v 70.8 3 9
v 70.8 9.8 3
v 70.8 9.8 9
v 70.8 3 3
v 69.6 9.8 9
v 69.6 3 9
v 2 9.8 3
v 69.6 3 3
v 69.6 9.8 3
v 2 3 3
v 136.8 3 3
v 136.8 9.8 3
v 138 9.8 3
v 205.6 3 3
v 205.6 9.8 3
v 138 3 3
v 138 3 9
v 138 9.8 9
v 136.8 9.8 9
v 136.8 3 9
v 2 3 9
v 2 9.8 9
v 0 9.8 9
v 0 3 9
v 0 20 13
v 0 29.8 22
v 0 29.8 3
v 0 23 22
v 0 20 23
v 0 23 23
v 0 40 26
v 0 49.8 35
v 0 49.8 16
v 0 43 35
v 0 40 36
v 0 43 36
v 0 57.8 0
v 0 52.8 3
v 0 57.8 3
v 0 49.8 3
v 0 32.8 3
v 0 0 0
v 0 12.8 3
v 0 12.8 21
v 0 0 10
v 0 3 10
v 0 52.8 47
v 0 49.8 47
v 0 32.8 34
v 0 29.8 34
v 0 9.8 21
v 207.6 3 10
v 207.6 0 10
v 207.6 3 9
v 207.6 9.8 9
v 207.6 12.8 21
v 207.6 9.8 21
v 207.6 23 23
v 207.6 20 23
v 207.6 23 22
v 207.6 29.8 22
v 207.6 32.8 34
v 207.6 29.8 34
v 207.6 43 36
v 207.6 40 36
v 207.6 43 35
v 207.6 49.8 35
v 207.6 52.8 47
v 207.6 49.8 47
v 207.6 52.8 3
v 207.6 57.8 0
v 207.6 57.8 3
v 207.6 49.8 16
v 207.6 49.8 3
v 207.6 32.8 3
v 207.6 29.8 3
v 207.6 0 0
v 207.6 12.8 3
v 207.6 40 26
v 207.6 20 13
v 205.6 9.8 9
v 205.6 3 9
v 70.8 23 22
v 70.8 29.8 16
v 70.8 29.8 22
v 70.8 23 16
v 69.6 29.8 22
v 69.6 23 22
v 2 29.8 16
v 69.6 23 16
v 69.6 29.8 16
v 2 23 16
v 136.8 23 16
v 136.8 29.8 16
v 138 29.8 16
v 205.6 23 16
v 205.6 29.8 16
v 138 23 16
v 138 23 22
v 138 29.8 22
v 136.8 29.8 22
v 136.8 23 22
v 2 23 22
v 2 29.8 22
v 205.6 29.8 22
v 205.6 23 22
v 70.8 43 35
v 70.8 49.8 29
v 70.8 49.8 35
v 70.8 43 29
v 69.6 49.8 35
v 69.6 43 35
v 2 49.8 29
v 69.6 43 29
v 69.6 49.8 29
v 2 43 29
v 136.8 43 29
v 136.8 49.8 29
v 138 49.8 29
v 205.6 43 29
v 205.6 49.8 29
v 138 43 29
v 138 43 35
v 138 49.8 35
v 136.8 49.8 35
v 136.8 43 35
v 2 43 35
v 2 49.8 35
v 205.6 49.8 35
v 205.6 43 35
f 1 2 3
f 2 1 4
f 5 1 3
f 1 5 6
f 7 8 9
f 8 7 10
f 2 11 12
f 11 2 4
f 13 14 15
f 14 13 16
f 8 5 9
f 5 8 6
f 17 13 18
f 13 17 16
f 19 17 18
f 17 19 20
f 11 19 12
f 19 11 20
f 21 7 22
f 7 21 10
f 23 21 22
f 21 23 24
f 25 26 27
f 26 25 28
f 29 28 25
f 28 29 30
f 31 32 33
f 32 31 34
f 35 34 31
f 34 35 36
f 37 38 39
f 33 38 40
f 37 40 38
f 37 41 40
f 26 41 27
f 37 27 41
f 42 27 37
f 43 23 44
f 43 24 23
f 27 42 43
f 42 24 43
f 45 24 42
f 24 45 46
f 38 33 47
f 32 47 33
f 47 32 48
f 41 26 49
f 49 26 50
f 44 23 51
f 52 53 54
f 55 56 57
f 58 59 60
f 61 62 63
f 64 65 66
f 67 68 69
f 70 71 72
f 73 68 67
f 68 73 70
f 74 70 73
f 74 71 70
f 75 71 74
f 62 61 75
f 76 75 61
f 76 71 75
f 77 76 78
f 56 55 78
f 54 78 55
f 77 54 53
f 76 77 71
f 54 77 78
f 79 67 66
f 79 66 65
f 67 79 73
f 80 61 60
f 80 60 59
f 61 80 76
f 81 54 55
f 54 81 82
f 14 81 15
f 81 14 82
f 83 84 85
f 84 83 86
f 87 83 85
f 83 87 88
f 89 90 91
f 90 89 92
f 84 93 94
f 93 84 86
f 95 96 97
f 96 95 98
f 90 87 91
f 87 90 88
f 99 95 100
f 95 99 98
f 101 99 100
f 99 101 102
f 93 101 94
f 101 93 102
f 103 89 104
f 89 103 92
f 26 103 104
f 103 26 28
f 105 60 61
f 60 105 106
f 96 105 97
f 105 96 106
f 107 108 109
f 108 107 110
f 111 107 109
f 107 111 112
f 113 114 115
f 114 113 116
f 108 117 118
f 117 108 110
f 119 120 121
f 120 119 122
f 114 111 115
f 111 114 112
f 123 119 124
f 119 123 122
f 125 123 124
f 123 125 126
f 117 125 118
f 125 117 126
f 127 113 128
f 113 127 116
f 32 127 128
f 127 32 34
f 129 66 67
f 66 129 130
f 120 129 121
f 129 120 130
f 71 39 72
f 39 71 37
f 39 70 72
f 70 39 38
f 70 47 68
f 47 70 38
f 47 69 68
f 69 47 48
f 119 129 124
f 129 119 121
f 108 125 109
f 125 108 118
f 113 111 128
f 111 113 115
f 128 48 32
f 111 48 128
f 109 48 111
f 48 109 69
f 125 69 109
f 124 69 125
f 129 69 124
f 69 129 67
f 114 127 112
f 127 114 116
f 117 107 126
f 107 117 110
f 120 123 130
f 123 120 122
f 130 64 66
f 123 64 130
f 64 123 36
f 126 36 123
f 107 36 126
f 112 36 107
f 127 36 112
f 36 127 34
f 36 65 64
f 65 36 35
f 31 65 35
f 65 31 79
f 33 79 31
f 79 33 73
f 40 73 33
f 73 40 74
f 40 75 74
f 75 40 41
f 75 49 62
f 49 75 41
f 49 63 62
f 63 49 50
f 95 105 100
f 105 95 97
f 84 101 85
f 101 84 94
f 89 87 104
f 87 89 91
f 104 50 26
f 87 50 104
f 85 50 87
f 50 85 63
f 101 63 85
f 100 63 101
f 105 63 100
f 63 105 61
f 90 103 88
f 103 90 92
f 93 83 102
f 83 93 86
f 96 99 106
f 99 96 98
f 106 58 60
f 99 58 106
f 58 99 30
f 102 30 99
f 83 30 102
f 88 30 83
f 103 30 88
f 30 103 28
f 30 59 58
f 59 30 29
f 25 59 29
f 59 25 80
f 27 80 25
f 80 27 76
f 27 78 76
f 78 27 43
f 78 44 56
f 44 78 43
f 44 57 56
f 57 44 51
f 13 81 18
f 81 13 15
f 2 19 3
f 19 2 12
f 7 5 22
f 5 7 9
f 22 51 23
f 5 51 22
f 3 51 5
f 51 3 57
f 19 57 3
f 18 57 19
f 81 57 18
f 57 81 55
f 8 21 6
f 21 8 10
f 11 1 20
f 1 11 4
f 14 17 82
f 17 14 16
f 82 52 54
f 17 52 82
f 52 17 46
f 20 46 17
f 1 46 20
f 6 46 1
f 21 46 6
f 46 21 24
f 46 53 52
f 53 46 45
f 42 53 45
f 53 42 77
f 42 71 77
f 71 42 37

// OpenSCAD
// Parametric WonderSwan cartridge organizer and fit coupon.
// Open in OpenSCAD, set `part`, press F6, then export STL.

part = "organizer"; // "organizer" or "coupon"

cartridge_width = 65.2;
cartridge_height = 41.8;
cartridge_thickness = 6.0;
slot_width = 6.8;

columns = 3;
rows = 3;
column_gap = 2.0;
side_margin = 4.0;

base_thickness = 3.0;
wall_thickness = 3.0;
floor_thickness = 3.0;
front_lip_height = 7.0;
back_support_height = 18.0;
row_pitch = 20.0;
row_rise = 13.0;
rear_margin = 5.0;
divider_thickness = 1.2;
divider_height = 6.0;

organizer_width = columns * cartridge_width
    + (columns - 1) * column_gap
    + 2 * side_margin;
organizer_depth = (rows - 1) * row_pitch
    + wall_thickness + slot_width + wall_thickness + rear_margin;

module profile_extrusion(width) {
    multmatrix([
        [0, 0, 1, 0],
        [1, 0, 0, 0],
        [0, 1, 0, 0],
        [0, 0, 0, 1]
    ])
        linear_extrude(height = width)
            children();
}

module organizer_profile() {
    union() {
        square([organizer_depth, base_thickness]);

        for (row = [0 : rows - 1]) {
            front_y = row * row_pitch;
            slot_front = front_y + wall_thickness;
            back_y = slot_front + slot_width;
            floor_z = base_thickness + row * row_rise;

            if (row > 0) {
                shelf_bottom = floor_z - floor_thickness;
                lower_support_z = max(
                    base_thickness,
                    shelf_bottom - row_rise + floor_thickness
                );
                translate([front_y, shelf_bottom])
                    square([
                        back_y + wall_thickness - front_y,
                        floor_thickness
                    ]);
                polygon([
                    [front_y, shelf_bottom],
                    [back_y, shelf_bottom],
                    [back_y, lower_support_z]
                ]);
            }

            translate([front_y, floor_z])
                square([wall_thickness, front_lip_height]);
            translate([back_y, base_thickness])
                square([
                    wall_thickness,
                    floor_z + back_support_height - base_thickness
                ]);
        }
    }
}

module organizer() {
    union() {
        profile_extrusion(organizer_width)
            organizer_profile();

        for (row = [0 : rows - 1]) {
            slot_front = row * row_pitch + wall_thickness;
            floor_z = base_thickness + row * row_rise;

            for (column = [1 : columns - 1]) {
                center_x = side_margin
                    + column * cartridge_width
                    + (column - 0.5) * column_gap;
                translate([
                    center_x - divider_thickness / 2,
                    slot_front - 0.2,
                    floor_z
                ])
                    cube([
                        divider_thickness,
                        slot_width + 0.4,
                        divider_height
                    ]);
            }

            for (x0 = [0, organizer_width - 2]) {
                translate([x0, slot_front - 0.2, floor_z])
                    cube([2, slot_width + 0.4, divider_height]);
            }
        }
    }
}

module clearance_coupon() {
    test_slots = [6.4, 6.8, 7.2];
    coupon_width = 35;
    edge_margin = 2;
    coupon_wall = 3;
    coupon_base = 3;
    coupon_wall_height = 10;
    coupon_depth = 2 * edge_margin
        + (len(test_slots) + 1) * coupon_wall
        + test_slots[0] + test_slots[1] + test_slots[2];

    union() {
        cube([coupon_width, coupon_depth, coupon_base]);
        translate([0, edge_margin, coupon_base])
            cube([coupon_width, coupon_wall, coupon_wall_height]);

        translate([
            0,
            edge_margin + coupon_wall + test_slots[0],
            coupon_base
        ])
            cube([coupon_width, coupon_wall, coupon_wall_height]);

        translate([
            0,
            edge_margin + 2 * coupon_wall + test_slots[0] + test_slots[1],
            coupon_base
        ])
            cube([coupon_width, coupon_wall, coupon_wall_height]);

        translate([
            0,
            edge_margin + 3 * coupon_wall
                + test_slots[0] + test_slots[1] + test_slots[2],
            coupon_base
        ])
            cube([coupon_width, coupon_wall, coupon_wall_height]);
    }
}

if (part == "organizer") {
    organizer();
} else {
    clearance_coupon();
}
